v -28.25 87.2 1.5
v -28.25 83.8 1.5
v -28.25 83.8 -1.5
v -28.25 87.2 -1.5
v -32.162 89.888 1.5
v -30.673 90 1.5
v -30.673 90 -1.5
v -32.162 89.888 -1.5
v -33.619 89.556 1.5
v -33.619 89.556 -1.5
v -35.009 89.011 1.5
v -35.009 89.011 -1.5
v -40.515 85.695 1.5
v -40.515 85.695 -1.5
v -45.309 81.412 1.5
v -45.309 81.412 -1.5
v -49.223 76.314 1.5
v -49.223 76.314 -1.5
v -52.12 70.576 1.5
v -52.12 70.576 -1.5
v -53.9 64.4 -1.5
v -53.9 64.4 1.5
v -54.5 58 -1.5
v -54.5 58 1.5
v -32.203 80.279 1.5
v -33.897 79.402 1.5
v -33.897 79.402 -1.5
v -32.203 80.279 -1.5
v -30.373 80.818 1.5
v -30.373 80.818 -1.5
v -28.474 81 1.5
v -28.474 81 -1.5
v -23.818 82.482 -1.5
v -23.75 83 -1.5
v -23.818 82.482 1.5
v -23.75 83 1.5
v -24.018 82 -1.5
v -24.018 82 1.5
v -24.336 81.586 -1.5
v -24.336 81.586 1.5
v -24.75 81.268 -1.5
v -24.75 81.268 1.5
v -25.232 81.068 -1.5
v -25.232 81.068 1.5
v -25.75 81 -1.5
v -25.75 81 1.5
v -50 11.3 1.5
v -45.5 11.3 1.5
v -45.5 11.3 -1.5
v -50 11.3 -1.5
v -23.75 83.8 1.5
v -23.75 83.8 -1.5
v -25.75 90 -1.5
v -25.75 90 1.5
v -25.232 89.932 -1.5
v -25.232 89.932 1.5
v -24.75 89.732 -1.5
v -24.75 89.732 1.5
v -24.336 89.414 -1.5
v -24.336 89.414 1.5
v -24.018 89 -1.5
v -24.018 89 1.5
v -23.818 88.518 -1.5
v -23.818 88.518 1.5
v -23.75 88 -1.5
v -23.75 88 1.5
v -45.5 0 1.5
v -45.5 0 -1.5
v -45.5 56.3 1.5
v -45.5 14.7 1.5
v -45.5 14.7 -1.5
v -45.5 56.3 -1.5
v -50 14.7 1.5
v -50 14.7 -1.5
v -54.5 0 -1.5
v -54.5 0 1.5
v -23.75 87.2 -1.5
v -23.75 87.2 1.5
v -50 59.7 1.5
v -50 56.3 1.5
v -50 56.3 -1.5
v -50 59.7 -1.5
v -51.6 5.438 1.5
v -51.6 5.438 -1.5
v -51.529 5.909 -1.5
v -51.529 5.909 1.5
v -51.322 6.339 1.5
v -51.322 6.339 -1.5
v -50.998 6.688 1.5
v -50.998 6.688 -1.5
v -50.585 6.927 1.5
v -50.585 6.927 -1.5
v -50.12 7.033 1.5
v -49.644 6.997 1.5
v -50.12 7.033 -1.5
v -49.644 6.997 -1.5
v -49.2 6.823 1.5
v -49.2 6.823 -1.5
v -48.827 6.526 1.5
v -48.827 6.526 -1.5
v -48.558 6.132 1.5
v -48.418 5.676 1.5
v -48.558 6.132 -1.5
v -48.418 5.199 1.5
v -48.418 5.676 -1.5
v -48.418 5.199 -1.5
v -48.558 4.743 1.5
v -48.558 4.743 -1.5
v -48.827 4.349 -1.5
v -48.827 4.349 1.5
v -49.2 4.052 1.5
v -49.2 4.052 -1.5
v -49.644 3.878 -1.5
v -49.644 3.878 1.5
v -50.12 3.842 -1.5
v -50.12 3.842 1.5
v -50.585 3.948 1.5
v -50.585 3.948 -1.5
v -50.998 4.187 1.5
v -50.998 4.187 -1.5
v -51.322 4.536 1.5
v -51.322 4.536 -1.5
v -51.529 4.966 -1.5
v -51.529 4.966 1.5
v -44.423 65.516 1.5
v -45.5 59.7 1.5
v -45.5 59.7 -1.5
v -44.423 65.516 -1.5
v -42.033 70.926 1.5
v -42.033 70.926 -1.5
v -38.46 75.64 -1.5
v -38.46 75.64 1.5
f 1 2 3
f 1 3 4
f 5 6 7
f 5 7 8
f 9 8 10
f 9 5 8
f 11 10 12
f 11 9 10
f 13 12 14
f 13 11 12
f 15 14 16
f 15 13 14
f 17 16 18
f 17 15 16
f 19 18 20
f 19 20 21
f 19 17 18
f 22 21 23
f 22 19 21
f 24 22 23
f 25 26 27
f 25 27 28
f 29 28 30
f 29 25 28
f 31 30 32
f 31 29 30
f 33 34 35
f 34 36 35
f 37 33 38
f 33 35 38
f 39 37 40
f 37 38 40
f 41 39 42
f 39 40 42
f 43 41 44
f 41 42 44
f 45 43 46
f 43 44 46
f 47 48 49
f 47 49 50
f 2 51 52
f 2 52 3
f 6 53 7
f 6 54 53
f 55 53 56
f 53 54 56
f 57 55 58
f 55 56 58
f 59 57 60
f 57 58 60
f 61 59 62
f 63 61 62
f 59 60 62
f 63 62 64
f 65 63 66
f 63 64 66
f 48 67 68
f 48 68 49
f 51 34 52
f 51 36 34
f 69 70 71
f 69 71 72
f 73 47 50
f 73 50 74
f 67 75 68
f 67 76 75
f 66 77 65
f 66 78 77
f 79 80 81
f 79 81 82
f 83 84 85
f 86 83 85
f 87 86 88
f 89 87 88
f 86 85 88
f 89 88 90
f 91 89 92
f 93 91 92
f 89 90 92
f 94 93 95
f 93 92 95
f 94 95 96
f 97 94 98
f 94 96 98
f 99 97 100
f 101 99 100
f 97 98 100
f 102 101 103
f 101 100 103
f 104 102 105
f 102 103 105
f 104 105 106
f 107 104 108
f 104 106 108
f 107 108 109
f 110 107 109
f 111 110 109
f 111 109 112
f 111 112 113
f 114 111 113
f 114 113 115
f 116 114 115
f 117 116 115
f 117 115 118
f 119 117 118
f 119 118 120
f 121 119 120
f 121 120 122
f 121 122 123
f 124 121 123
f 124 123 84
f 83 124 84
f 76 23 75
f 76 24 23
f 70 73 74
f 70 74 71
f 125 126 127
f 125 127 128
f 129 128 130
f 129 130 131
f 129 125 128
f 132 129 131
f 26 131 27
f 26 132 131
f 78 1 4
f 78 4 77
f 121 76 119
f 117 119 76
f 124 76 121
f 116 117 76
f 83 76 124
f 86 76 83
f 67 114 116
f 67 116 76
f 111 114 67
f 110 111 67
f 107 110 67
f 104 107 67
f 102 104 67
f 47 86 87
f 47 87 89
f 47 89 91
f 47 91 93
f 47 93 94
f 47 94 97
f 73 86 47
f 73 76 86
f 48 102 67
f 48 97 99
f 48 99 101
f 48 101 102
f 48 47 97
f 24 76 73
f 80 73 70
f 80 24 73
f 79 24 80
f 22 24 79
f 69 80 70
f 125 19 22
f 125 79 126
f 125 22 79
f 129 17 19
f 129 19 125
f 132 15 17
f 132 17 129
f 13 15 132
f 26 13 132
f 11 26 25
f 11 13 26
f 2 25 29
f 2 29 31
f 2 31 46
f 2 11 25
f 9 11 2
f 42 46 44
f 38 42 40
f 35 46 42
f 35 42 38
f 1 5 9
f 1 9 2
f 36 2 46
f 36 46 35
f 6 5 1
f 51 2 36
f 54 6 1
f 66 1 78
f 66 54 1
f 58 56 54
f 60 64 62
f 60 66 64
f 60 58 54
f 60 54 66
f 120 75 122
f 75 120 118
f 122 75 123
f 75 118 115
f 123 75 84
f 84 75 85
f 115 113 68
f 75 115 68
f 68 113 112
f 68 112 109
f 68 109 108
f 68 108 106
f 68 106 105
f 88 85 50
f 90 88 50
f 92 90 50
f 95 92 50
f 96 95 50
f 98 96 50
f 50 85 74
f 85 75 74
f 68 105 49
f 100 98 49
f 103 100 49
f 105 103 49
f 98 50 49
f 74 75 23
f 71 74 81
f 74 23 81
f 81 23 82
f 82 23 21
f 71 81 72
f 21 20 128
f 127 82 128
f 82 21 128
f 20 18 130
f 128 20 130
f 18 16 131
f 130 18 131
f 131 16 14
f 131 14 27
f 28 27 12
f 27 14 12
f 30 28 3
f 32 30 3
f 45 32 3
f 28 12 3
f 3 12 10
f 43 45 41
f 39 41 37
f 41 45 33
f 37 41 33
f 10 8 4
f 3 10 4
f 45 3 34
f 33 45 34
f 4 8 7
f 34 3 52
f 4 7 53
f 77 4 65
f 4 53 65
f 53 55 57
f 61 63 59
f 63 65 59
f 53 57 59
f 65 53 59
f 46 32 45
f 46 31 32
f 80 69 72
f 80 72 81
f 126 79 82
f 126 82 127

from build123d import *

# Parameters (mm, degrees)
BOSS_EXTRUDE1_DEPTH      = 1.5
M3_CLEARANCE_HOLE1_D     = 3.2
M3_CLEARANCE_HOLE1_DEPTH = 10
M3_CLEARANCE_HOLE1_TIP   = 0.96137699
FILLET1_R                = 2


with BuildPart() as part:
    # Sketch1 → Boss-Extrude1 (new, symmetric)
    with BuildSketch(Plane.XY):
        with BuildLine():
            Line((-54.5, 0), (-45.5, 0))
            Line((-45.5, 0), (-45.5, 11.3))
            Line((-45.5, 11.3), (-50, 11.3))
            Line((-50, 11.3), (-50, 14.7))
            Line((-50, 14.7), (-45.5, 14.7))
            Line((-45.5, 14.7), (-45.5, 56.3))
            Line((-45.5, 56.3), (-50, 56.3))
            Line((-50, 56.3), (-50, 59.7))
            Line((-50, 59.7), (-45.5, 59.7))
            ThreePointArc((-45.5, 59.7), (-42.033246866, 70.926263127), (-33.896614513, 79.402263071))
            ThreePointArc((-33.896614513, 79.402263071), (-31.300681808, 80.592252882), (-28.474255682, 81))
            Line((-28.474255682, 81), (-23.75, 81))
            Line((-23.75, 81), (-23.75, 83.8))
            Line((-23.75, 83.8), (-28.25, 83.8))
            Line((-28.25, 83.8), (-28.25, 87.2))
            Line((-28.25, 87.2), (-23.75, 87.2))
            Line((-23.75, 87.2), (-23.75, 90))
            Line((-23.75, 90), (-30.672661807, 90))
            ThreePointArc((-30.672661807, 90), (-32.89665693, 89.749556179), (-35.009254886, 89.010769138))
            ThreePointArc((-35.009254886, 89.010769138), (-49.222697481, 76.313635273), (-54.5, 58))
            Line((-54.5, 58), (-54.5, 0))
        make_face()
    extrude(amount=BOSS_EXTRUDE1_DEPTH, both=True)

    # M3 Clearance Hole1
    with Locations(Plane.XY.offset(1.5)):
        with Locations((-50, 5.4375)):
            Hole(M3_CLEARANCE_HOLE1_D / 2, depth=M3_CLEARANCE_HOLE1_DEPTH)
            with Locations((0, 0, -(M3_CLEARANCE_HOLE1_DEPTH + M3_CLEARANCE_HOLE1_TIP / 2))):  # 118° drill point
                Cone(0, M3_CLEARANCE_HOLE1_D / 2, M3_CLEARANCE_HOLE1_TIP, mode=Mode.SUBTRACT)

    # Fillet1
    fillet1_edges = [part.edges().sort_by_distance(p)[0] for p in [
        (-23.75, 90, 0),
        (-23.75, 81, 0),
    ]]
    fillet(fillet1_edges, radius=FILLET1_R)


solid = part.part
